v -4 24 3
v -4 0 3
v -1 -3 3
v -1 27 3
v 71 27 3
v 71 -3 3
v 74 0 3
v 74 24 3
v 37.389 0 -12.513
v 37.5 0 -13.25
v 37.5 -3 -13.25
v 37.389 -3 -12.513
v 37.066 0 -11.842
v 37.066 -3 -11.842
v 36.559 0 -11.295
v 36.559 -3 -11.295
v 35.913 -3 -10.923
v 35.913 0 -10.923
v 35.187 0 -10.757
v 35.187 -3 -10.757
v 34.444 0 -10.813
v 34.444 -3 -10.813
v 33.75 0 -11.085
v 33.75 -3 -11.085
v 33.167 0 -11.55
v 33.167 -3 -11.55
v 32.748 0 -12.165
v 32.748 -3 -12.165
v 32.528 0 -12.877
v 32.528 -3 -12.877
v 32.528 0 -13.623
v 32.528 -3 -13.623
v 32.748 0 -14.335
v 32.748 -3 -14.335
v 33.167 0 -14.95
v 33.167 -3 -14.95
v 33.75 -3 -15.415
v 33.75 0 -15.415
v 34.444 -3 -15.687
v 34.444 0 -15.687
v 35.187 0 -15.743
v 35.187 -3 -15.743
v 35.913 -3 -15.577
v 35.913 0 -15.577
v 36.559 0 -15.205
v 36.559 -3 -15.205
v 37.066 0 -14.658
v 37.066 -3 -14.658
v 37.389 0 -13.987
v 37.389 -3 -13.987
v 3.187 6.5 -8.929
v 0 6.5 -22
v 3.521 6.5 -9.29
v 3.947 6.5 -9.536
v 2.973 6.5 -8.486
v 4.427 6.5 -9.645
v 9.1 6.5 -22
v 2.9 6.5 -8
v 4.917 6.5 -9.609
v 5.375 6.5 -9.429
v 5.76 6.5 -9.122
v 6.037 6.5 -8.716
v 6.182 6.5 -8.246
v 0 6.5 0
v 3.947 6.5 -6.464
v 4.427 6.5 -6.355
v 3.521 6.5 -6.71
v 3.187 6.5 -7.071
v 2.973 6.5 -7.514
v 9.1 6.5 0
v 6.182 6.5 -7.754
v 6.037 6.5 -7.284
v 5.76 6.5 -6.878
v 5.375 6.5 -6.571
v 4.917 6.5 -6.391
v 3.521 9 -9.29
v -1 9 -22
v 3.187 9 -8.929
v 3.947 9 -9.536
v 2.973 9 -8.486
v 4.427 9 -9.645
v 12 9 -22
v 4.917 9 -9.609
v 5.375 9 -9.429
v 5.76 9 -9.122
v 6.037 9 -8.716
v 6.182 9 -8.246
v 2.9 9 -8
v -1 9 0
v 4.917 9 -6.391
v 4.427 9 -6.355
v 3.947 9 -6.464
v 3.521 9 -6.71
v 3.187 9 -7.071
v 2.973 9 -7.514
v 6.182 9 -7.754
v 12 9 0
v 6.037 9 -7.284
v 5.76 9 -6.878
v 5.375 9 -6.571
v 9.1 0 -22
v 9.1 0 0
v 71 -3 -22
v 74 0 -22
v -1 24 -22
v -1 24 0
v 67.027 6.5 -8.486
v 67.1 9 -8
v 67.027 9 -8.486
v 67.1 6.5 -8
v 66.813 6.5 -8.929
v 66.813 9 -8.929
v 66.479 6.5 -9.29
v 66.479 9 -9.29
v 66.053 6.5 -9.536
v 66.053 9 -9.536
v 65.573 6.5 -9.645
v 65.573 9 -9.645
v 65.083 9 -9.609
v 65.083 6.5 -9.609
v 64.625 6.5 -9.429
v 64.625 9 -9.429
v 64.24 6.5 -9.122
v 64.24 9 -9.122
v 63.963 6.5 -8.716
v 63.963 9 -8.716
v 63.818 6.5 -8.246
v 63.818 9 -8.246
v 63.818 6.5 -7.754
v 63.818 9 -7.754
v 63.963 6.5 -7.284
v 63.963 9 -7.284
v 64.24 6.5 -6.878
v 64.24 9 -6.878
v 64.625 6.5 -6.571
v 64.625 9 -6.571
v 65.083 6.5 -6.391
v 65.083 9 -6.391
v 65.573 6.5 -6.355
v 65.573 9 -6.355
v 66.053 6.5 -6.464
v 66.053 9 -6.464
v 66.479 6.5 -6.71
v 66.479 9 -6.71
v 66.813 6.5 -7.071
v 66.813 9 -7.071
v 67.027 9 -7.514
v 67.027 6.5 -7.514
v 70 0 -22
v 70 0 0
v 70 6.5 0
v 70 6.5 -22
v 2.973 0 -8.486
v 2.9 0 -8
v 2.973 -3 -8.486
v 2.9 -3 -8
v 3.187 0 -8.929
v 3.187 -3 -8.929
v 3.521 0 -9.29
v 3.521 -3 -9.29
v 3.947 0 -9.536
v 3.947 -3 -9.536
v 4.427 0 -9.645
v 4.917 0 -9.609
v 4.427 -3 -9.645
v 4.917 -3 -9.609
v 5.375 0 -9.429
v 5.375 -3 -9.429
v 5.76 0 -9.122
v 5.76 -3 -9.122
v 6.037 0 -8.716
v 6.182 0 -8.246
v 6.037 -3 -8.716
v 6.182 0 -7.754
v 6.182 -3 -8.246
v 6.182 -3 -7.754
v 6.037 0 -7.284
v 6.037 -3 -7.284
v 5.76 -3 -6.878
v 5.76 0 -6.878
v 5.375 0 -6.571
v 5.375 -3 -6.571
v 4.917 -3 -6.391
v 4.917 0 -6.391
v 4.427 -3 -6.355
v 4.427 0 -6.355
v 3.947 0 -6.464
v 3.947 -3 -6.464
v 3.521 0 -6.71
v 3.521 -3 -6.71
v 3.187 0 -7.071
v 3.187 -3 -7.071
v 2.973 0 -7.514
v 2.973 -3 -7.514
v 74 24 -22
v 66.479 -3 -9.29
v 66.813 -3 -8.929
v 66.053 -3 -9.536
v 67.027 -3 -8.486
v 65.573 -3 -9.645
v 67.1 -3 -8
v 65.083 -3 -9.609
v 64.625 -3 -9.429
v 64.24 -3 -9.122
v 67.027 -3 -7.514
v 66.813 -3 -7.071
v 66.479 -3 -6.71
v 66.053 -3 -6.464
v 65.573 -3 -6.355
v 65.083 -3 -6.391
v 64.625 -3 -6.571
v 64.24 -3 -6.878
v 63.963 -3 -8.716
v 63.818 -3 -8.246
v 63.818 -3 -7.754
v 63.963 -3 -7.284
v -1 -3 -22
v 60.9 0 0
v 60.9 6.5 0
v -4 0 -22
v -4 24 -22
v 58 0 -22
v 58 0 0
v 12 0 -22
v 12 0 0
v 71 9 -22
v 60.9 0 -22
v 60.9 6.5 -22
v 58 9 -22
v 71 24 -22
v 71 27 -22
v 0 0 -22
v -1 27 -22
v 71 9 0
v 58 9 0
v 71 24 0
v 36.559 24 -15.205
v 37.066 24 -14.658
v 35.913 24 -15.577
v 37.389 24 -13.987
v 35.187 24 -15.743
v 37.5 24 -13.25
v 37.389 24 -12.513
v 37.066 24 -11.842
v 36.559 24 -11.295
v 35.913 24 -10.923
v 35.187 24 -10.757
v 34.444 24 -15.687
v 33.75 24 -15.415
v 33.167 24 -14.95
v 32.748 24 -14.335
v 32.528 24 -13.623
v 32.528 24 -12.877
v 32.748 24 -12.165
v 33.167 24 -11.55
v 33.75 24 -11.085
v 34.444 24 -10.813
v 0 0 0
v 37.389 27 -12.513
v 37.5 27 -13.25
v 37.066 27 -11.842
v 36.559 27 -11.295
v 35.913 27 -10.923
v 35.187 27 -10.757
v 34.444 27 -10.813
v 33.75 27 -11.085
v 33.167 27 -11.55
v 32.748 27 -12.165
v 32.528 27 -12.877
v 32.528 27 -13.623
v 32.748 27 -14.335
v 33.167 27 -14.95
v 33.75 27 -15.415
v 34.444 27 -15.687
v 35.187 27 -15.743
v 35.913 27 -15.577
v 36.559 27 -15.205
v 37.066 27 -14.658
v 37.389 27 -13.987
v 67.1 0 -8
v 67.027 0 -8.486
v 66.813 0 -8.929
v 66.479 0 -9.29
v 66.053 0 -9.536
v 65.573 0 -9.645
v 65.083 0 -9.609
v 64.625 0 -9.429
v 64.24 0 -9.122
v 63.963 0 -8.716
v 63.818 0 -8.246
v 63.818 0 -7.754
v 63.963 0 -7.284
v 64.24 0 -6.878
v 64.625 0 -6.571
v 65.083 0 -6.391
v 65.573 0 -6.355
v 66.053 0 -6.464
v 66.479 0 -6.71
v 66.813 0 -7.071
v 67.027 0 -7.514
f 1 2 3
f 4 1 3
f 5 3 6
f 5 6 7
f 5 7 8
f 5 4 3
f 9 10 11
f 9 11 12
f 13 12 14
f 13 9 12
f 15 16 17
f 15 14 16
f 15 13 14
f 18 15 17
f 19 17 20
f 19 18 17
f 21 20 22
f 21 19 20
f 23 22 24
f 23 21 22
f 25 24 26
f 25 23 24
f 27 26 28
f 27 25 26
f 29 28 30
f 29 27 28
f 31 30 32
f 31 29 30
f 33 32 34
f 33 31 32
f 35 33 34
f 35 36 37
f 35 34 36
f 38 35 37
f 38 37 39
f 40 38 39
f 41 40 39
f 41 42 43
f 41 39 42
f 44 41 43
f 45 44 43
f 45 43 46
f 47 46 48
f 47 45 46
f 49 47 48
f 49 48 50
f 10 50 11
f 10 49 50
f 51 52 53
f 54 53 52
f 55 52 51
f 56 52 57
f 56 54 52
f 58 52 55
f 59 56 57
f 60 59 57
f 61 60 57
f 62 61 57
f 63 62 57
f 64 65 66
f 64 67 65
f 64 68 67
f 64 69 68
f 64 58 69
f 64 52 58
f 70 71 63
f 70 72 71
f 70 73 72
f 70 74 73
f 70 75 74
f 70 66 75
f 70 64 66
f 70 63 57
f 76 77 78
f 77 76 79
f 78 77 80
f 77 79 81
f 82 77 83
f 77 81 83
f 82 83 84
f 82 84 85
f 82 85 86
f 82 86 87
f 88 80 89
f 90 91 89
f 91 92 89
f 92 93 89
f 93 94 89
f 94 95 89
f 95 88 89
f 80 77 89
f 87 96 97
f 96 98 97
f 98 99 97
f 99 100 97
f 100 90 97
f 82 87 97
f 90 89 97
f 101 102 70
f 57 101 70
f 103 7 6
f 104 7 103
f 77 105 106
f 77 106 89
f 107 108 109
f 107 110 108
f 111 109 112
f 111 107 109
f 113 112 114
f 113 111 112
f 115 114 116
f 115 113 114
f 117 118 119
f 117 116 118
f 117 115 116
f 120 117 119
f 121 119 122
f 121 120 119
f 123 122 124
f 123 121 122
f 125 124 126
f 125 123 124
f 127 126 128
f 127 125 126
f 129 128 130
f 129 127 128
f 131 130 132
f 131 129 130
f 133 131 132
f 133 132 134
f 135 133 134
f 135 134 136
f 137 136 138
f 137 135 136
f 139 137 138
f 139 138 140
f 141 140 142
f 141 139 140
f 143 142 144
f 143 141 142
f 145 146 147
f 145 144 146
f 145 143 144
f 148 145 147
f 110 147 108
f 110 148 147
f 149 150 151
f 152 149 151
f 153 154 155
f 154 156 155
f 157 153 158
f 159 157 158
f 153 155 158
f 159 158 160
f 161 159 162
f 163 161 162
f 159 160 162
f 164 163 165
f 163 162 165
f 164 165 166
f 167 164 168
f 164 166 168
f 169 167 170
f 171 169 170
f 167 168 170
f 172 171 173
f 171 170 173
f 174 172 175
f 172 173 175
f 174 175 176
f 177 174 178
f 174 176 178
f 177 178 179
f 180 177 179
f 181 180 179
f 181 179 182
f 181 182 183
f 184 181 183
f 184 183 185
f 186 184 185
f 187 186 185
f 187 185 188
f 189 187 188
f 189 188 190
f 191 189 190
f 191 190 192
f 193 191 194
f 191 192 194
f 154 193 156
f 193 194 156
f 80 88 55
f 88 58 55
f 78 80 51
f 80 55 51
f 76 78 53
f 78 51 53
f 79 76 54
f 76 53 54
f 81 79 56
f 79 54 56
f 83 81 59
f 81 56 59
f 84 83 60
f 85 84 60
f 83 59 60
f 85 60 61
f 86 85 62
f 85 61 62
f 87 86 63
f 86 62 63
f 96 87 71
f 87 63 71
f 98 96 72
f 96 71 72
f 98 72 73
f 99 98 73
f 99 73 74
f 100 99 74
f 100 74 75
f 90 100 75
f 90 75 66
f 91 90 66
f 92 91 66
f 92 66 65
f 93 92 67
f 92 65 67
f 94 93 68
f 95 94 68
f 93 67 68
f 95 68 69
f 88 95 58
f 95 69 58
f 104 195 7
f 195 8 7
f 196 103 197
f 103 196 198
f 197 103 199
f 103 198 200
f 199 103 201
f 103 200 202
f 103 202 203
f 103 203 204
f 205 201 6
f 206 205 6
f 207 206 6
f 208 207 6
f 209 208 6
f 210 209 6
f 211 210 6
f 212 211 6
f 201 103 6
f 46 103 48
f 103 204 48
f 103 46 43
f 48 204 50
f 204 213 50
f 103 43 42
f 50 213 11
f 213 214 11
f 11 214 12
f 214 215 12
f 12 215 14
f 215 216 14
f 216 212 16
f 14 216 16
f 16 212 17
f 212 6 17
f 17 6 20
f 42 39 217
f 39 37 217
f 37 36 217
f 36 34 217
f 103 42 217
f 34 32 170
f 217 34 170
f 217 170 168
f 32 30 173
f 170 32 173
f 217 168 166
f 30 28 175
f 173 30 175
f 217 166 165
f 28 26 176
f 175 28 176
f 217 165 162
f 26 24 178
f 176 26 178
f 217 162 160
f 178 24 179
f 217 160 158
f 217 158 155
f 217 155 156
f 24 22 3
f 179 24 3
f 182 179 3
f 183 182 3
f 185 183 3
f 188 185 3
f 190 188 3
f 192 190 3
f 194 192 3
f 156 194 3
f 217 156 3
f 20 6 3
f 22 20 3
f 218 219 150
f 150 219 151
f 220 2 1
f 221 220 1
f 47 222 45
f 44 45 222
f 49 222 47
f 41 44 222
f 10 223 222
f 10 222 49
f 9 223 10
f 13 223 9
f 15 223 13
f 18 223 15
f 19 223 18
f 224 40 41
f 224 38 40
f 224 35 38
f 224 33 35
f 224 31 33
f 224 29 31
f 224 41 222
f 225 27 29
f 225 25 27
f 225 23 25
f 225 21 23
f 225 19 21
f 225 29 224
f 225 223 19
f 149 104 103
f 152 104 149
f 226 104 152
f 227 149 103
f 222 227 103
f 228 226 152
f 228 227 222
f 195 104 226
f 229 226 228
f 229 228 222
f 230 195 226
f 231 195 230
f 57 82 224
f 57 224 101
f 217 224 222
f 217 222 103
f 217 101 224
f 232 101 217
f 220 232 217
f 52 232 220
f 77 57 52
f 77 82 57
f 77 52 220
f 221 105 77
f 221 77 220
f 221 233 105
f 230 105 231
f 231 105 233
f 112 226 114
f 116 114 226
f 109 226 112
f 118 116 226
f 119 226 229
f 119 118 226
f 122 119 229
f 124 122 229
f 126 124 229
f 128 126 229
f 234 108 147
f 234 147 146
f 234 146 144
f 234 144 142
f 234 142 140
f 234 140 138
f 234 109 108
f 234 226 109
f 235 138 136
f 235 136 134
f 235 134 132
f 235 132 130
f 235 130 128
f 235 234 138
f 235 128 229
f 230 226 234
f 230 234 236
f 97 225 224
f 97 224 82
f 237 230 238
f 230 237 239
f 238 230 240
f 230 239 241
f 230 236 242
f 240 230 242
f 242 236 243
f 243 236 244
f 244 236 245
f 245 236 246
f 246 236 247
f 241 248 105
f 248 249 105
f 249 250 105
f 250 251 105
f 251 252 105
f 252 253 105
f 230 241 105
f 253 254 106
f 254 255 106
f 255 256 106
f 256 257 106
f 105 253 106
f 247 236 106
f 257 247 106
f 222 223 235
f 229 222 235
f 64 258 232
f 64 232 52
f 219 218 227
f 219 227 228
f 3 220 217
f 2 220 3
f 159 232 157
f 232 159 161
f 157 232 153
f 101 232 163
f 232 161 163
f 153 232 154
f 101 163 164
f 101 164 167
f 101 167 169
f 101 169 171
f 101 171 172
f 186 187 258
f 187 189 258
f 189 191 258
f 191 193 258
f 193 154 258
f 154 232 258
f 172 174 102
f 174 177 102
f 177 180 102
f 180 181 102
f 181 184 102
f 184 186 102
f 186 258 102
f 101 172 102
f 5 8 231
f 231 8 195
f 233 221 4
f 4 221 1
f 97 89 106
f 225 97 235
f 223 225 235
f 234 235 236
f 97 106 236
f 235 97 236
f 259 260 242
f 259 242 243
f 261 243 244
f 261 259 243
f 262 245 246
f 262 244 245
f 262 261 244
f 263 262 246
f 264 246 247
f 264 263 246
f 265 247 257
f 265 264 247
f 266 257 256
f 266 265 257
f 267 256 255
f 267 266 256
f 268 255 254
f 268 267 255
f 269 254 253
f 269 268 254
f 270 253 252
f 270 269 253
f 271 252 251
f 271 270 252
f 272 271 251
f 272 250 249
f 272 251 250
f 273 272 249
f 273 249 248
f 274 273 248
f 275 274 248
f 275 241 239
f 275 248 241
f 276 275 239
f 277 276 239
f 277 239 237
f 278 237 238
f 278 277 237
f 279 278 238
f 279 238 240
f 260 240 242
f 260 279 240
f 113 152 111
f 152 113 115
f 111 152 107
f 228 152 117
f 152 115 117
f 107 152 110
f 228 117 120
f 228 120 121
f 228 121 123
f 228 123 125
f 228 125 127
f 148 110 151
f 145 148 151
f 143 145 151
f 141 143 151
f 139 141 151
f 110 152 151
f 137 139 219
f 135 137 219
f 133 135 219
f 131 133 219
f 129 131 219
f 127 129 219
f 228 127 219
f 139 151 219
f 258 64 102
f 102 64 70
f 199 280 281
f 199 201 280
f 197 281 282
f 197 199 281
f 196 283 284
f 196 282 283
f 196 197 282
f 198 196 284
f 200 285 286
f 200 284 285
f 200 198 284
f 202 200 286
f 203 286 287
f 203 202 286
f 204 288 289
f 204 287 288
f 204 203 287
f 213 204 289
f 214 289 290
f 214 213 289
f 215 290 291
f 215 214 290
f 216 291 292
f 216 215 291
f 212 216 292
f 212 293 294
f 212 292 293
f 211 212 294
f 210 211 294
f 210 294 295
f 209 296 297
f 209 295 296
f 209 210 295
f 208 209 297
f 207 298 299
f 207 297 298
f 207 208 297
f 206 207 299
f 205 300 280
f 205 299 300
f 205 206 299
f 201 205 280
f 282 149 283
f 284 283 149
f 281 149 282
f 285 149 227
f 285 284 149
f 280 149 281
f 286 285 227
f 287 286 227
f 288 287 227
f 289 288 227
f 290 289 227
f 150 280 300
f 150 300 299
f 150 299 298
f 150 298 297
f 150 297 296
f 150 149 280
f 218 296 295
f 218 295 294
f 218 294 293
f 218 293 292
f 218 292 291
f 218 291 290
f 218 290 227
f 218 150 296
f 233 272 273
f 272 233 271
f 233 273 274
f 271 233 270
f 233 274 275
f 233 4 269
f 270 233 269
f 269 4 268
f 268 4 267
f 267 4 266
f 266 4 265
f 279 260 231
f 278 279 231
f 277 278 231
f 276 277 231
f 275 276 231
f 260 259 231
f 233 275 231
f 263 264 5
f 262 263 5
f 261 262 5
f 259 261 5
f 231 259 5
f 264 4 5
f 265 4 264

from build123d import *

# Parameters (mm, degrees)
SKETCH_1_W               = 70
SKETCH_1_H               = 20
EXTRUDE_1_DEPTH          = 3
SKETCH_2_W               = 78
SKETCH_2_H               = 30
EXTRUDE_2_DEPTH          = 3
SKETCH_4_W               = 16
SKETCH_4_H               = 12
SKETCH_4_W_2             = 9.1
SKETCH_4_H_2             = 6.5
EXTRUDE_3_DEPTH          = 22
SKETCH_5_W               = 46
SKETCH_5_H               = 3
EXTRUDE_4_DEPTH          = 22
EXTRUDE_5_DEPTH          = 22
CHAMFER_1_SIZE           = 3
CUT_EXTRUDE_1_DEPTH      = 82.786306922
CUT_EXTRUDE_1_DEPTH_BACK = 82.786306922
SKETCH_10_R              = 2.5
SKETCH_11_R              = 1.65
CUT_EXTRUDE_2_DEPTH      = 10


with BuildPart() as part:
    # 草图1 → 凸台-拉伸1 (new body)
    with BuildSketch(Plane.XY):
        with Locations((35, 10)):
            Rectangle(SKETCH_1_W, SKETCH_1_H)
    extrude(amount=EXTRUDE_1_DEPTH)

    # 草图2 → 凸台-拉伸2 (add)
    with BuildSketch(Plane.XY.offset(3)):
        with Locations((35, 12)):
            Rectangle(SKETCH_2_W, SKETCH_2_H)
    extrude(amount=-EXTRUDE_2_DEPTH)

    # 草图4 → 凸台-拉伸3 (add)
    with BuildSketch(Plane(origin=(0, 0, 0), x_dir=(-1, 0, 0), z_dir=(0, 0, -1))):
        with Locations((-66, 3)):
            Rectangle(SKETCH_4_W, SKETCH_4_H)
        with Locations((-65.45, 3.25)):
            Rectangle(SKETCH_4_W_2, SKETCH_4_H_2, mode=Mode.SUBTRACT)
    extrude_3 = extrude(amount=EXTRUDE_3_DEPTH)

    # 镜向1: 凸台-拉伸3 across plane
    add(extrude_3.mirror(Plane(origin=(35, 0, 0), x_dir=(0, 0, 1), z_dir=(1, 0, 0))))

    # 草图5 → 凸台-拉伸4 (add)
    with BuildSketch(Plane(origin=(0, 0, 0), x_dir=(-1, 0, 0), z_dir=(0, 0, -1))):
        with Locations((-35, -1.5)):
            Rectangle(SKETCH_5_W, SKETCH_5_H)
    extrude(amount=EXTRUDE_4_DEPTH)

    # 草图6 → 凸台-拉伸5 (add)
    with BuildSketch(Plane(origin=(0, 0, 0), x_dir=(-1, 0, 0), z_dir=(0, 0, -1))):
        Polygon((4, 27), (-74, 27), (-74, 24), (-74, 9), (-71, 9), (-71, 24), (1, 24), (1, 9), (4, 9), (4, 24), align=None)
    extrude(amount=EXTRUDE_5_DEPTH)

    # 倒角1
    chamfer_1_edges = [part.edges().sort_by_distance(p)[0] for p in [
        (-4, -3, -9.5),
        (-4, 27, -9.5),
        (74, 27, -9.5),
        (74, -3, -9.5),
    ]]
    chamfer(chamfer_1_edges, length=CHAMFER_1_SIZE)

    # 草图10 → 切除-拉伸1 (cut, two sides: drawn at the far end of the back side and taken through both)
    with BuildSketch(Plane.XZ.offset(-24).offset(-CUT_EXTRUDE_1_DEPTH_BACK)):
        with Locations((35, -13.25)):
            Circle(SKETCH_10_R)
    extrude(amount=CUT_EXTRUDE_1_DEPTH + CUT_EXTRUDE_1_DEPTH_BACK, mode=Mode.SUBTRACT)

    # 草图11 → 切除-拉伸2 (cut, symmetric)
    with BuildSketch(Plane.XZ.offset(-6.5)):
        with Locations(Location((4.55, -8, 0), (0, 0, 180))):
            Circle(SKETCH_11_R)
    cut_extrude_2 = extrude(amount=CUT_EXTRUDE_2_DEPTH, both=True, mode=Mode.SUBTRACT)

    # 镜向2: 切除-拉伸2 across plane
    add(cut_extrude_2.mirror(Plane(origin=(35, 0, 0), x_dir=(0, 0, 1), z_dir=(1, 0, 0))), mode=Mode.SUBTRACT)


solid = part.part
